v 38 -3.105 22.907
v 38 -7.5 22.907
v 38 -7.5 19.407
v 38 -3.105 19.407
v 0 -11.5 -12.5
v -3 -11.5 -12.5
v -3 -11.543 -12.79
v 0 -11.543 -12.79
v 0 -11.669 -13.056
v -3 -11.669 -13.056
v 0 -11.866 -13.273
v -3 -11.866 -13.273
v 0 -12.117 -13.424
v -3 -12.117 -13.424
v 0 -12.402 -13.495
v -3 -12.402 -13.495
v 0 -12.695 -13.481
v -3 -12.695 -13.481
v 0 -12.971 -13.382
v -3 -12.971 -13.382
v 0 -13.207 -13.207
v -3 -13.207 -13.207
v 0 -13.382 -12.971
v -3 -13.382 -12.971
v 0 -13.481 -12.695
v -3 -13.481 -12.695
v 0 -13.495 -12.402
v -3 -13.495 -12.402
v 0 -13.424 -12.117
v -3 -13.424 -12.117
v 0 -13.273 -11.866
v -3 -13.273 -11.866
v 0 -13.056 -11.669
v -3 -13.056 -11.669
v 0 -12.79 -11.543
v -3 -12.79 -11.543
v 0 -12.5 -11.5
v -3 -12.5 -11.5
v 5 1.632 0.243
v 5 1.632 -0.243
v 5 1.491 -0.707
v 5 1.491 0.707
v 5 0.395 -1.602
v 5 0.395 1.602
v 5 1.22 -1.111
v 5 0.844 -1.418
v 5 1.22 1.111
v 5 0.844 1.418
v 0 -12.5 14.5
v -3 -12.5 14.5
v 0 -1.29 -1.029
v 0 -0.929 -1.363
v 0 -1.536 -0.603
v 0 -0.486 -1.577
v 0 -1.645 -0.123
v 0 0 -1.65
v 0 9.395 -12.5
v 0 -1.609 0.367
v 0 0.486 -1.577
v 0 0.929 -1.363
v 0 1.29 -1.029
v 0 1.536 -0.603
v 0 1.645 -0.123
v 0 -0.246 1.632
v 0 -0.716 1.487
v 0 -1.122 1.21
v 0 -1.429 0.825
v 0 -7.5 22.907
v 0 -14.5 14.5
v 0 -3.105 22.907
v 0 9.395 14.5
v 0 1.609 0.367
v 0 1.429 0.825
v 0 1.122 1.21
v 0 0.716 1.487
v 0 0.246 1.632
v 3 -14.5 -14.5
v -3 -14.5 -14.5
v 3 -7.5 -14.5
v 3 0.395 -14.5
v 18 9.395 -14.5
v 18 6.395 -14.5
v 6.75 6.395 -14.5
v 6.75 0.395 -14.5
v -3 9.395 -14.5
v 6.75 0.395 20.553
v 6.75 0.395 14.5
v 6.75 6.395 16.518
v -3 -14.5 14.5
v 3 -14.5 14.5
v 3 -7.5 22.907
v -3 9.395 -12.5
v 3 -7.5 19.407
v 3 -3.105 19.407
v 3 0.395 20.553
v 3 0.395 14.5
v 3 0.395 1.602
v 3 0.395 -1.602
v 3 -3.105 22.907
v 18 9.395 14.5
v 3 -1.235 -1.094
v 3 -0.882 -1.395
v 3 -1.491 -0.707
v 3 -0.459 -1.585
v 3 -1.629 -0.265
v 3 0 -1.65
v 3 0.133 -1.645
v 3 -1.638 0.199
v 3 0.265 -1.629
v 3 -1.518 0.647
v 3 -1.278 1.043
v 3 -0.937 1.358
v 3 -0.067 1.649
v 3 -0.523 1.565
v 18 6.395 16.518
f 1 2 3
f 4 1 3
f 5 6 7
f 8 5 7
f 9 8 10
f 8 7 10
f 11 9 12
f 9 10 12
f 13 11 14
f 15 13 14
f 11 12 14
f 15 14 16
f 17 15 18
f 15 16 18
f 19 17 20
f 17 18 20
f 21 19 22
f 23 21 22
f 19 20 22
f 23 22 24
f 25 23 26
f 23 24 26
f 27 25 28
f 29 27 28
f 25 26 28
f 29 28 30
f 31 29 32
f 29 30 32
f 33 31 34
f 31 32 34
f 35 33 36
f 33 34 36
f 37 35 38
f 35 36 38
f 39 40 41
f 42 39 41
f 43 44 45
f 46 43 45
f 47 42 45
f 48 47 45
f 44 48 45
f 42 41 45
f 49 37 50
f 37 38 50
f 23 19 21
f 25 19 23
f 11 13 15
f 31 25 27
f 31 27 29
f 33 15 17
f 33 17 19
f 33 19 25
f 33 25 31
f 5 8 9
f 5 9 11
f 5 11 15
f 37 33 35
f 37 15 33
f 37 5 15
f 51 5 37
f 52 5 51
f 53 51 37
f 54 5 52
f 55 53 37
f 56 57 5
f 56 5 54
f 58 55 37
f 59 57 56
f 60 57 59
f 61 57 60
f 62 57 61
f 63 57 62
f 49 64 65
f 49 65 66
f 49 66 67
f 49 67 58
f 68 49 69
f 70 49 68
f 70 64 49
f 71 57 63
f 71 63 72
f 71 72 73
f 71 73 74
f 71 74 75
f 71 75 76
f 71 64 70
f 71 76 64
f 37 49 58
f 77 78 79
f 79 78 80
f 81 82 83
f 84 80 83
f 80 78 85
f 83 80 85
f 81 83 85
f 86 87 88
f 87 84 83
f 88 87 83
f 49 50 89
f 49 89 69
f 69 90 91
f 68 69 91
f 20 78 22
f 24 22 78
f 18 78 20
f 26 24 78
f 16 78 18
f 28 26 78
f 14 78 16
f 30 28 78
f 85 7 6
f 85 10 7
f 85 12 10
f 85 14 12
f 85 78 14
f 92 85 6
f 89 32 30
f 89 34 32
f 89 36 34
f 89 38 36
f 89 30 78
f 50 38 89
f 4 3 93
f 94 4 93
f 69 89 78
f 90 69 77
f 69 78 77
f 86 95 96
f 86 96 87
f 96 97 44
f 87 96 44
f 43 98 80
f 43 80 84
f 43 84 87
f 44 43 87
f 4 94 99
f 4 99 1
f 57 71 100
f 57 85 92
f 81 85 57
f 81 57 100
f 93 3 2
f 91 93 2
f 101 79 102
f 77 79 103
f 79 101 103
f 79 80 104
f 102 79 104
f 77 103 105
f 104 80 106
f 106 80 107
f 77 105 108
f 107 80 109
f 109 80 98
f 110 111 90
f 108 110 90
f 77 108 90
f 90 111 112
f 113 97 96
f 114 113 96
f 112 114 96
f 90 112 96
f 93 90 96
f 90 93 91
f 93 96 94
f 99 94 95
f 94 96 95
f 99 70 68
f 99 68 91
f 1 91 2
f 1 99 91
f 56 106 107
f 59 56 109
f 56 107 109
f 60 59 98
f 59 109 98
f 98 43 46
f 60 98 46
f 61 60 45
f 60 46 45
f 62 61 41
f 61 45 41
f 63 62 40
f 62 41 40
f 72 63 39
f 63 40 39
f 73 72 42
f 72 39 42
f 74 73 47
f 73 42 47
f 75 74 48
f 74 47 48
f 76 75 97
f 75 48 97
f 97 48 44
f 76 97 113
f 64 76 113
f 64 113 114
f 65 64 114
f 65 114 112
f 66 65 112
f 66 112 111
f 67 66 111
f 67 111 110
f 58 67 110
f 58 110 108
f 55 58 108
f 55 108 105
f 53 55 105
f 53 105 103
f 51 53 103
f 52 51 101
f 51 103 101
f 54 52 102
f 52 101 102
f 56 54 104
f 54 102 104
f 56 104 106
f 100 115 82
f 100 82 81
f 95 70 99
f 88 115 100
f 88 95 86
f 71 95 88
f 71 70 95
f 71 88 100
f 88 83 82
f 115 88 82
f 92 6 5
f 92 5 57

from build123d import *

# Parameters (mm, degrees)
EXTRUDE_1_DEPTH        = 5
EXTRUDE_1_DEPTH_BACK   = 3
SKETCH_2_W             = 29
SKETCH_2_H             = 29
SKETCH_3_W             = 25
SKETCH_3_H             = 25
CUT_EXTRUDE_1_DEPTH    = 3
SKETCH_5_R             = 1
CUT_EXTRUDE_3_DEPTH    = 3
CUT_EXTRUDE_4_DEPTH    = 23.011360703
HOLE_WIZARD_M4_1_D     = 3.3
HOLE_WIZARD_M4_1_DEPTH = 10.1
HOLE_WIZARD_M4_1_TIP   = 0.991420021
SKETCH_4_W             = 8
SKETCH_4_H             = 29
EXTRUDE_2_DEPTH        = 13.4052
SKETCH_7_W             = 29
SKETCH_7_H             = 5
EXTRUDE_3_DEPTH        = 5
SKETCH_10_W            = 29
SKETCH_10_H            = 13.4052
CUT_EXTRUDE_5_DEPTH    = 35.028667136
EXTRUDE_4_DEPTH        = 28
SKETCH_13_W            = 22.441758485
SKETCH_13_H            = 29
CUT_EXTRUDE_7_DEPTH    = 20.8948
SKETCH_14_W            = 27
SKETCH_14_H            = 6.1052
CUT_EXTRUDE_8_DEPTH    = 10
EXTRUDE_5_DEPTH        = 10
SKETCH_16_W            = 12.441758485
SKETCH_16_H            = 20.8948
CUT_EXTRUDE_9_DEPTH    = 5
CUT_EXTRUDE_10_DEPTH   = 5
SKETCH_18_W            = 7.441758485
SKETCH_18_H            = 20.8948
CUT_EXTRUDE_11_DEPTH   = 1.9068532
SKETCH_19_W            = 18
SKETCH_19_H            = 8
CUT_EXTRUDE_12_DEPTH   = 7
SKETCH_20_W            = 3.0931468
SKETCH_20_H            = 11
EXTRUDE_6_DEPTH        = 20
SKETCH_21_W            = 3.0931468
SKETCH_21_H            = 2.8948
CUT_EXTRUDE_13_DEPTH   = 7.441758485
SKETCH_22_W            = 29
SKETCH_22_H            = 7
CUT_EXTRUDE_14_DEPTH   = 7.558241515
EXTRUDE_7_DEPTH        = 3
SKETCH_24_W            = 3
SKETCH_24_H            = 11
CUT_EXTRUDE_15_DEPTH   = 50.942466899
CUT_EXTRUDE_16_DEPTH   = 3.8082415
SKETCH_26_W            = 11.249999985
SKETCH_26_H            = 6.1052
CUT_EXTRUDE_17_DEPTH   = 6.0931468
SKETCH_27_W            = 6.0931468
SKETCH_27_H            = 6.1052
CUT_EXTRUDE_18_DEPTH   = 43.86096708
CUT_EXTRUDE_19_DEPTH   = 3.1052
SKETCH_30_W            = 3.750000015
SKETCH_30_H            = 32.721043552
CUT_EXTRUDE_20_DEPTH   = 7.8948
CUT_EXTRUDE_21_DEPTH   = 4.9068532
SKETCH_32_W            = 31.249999985
SKETCH_32_H            = 6.0931468
CUT_EXTRUDE_22_DEPTH   = 3.5
SKETCH_33_W            = 11
SKETCH_33_H            = 13.8948
EXTRUDE_8_DEPTH        = 3
SKETCH_34_W            = 11
SKETCH_34_H            = 6.3948
CUT_EXTRUDE_25_DEPTH   = 49.005208051
EXTRUDE_9_DEPTH        = 0.3948
SKETCH_36_W            = 38
SKETCH_36_H            = 7.8948
CUT_EXTRUDE_26_DEPTH   = 2.5931468
CUT_EXTRUDE_27_DEPTH   = 3.5
SKETCH_38_W            = 1.185809648
SKETCH_38_H            = 4.3948
CUT_EXTRUDE_28_DEPTH   = 3.750000015
EXTRUDE_11_DEPTH       = 3
EXTRUDE_12_REACH       = 51.952


with BuildPart() as part:
    # 草图2 → 凸台-拉伸1 (new, two sides: drawn at the far end of the back side and taken through both)
    with BuildSketch(Plane(origin=(0, 0, 0), x_dir=(0, 0, -1), z_dir=(1, 0, 0)).offset(-EXTRUDE_1_DEPTH_BACK)):
        Rectangle(SKETCH_2_W, SKETCH_2_H)
    extrude(amount=EXTRUDE_1_DEPTH + EXTRUDE_1_DEPTH_BACK)

    # 草图3 → 切除-拉伸1 (cut)
    with BuildSketch(Plane.ZY.offset(3)):
        Rectangle(SKETCH_3_W, SKETCH_3_H)
    extrude(amount=-CUT_EXTRUDE_1_DEPTH, mode=Mode.SUBTRACT)

    # 草图5 → 切除-拉伸3 (cut)
    with BuildSketch(Plane.ZY.offset(3)):
        with Locations((-12.5, -12.5)):
            Circle(SKETCH_5_R)
    extrude(amount=-CUT_EXTRUDE_3_DEPTH, mode=Mode.SUBTRACT)

    # 草图6 → 切除-拉伸4 (cut, through all)
    with BuildSketch(Plane.ZY.offset(3)):
        Polygon((12.5, 12.5), (12.5, -12.5), (14.5, -12.5), (14.5, 14.5), (-12.5, 14.5), (-14.5, 14.5), (-14.5, 12.5), (-12.5, 12.5), align=None)
    extrude(amount=-CUT_EXTRUDE_4_DEPTH, mode=Mode.SUBTRACT)

    # M4 螺纹孔1
    with Locations(Plane.ZY):
        with Locations((0, 0)):
            Hole(HOLE_WIZARD_M4_1_D / 2, depth=HOLE_WIZARD_M4_1_DEPTH)
            with Locations((0, 0, -(HOLE_WIZARD_M4_1_DEPTH + HOLE_WIZARD_M4_1_TIP / 2))):  # 118° drill point
                Cone(0, HOLE_WIZARD_M4_1_D / 2, HOLE_WIZARD_M4_1_TIP, mode=Mode.SUBTRACT)

    # 草图4 → 凸台-拉伸2 (add)
    with BuildSketch(Plane.XZ.offset(14.5)):
        with Locations((1, 0)):
            Rectangle(SKETCH_4_W, SKETCH_4_H)
    extrude(amount=EXTRUDE_2_DEPTH)

    # 草图7 → 凸台-拉伸3 (add)
    with BuildSketch(Plane(origin=(5, 0, 0), x_dir=(0, 0, -1), z_dir=(1, 0, 0))):
        with Locations((0, -25.4052)):
            Rectangle(SKETCH_7_W, SKETCH_7_H)
    extrude(amount=EXTRUDE_3_DEPTH)

    # 草图10 → 切除-拉伸5 (cut, through all)
    with BuildSketch(Plane.ZY.offset(3)):
        with Locations((0, -21.2026)):
            Rectangle(SKETCH_10_W, SKETCH_10_H)
    extrude(amount=-CUT_EXTRUDE_5_DEPTH, mode=Mode.SUBTRACT)

    # 草图12 → 凸台-拉伸4 (add)
    with BuildSketch(Plane(origin=(5, 0, 0), x_dir=(0, 0, -1), z_dir=(1, 0, 0))):
        Polygon((-14.5, -14.5), (14.5, -14.5), (14.5, 12.5), (-12.5, 12.5), (-12.5, -12.5), (-14.5, -12.5), align=None)
    extrude(amount=EXTRUDE_4_DEPTH)

    # 草图13 → 切除-拉伸7 (cut)
    with BuildSketch(Plane.XZ.offset(14.5)):
        with Locations((21.779120757, 0)):
            Rectangle(SKETCH_13_W, SKETCH_13_H)
    extrude(amount=-CUT_EXTRUDE_7_DEPTH, mode=Mode.SUBTRACT)

    # 草图14 → 切除-拉伸8 (cut)
    with BuildSketch(Plane(origin=(33, 0, 0), x_dir=(0, 0, -1), z_dir=(1, 0, 0))):
        with Locations((1, 9.4474)):
            Rectangle(SKETCH_14_W, SKETCH_14_H)
    extrude(amount=-CUT_EXTRUDE_8_DEPTH, mode=Mode.SUBTRACT)

    # 草图15 → 凸台-拉伸5 (add)
    with BuildSketch(Plane.XY.offset(12.5)):
        Polygon((23, 6.3948), (23, 12.5), (0, 12.5), (0, -14.5), (23, -14.5), align=None)
    extrude(amount=EXTRUDE_5_DEPTH)

    # 草图16 → 切除-拉伸9 (cut)
    with BuildSketch(Plane(origin=(0, 0, 12.5), x_dir=(-1, 0, 0), z_dir=(0, 0, -1))):
        with Locations((-16.779120757, -4.0526)):
            Rectangle(SKETCH_16_W, SKETCH_16_H)
    extrude(amount=-CUT_EXTRUDE_9_DEPTH, mode=Mode.SUBTRACT)

    # 草图17 → 切除-拉伸10 (cut)
    with BuildSketch(Plane(origin=(23, 0, 0), x_dir=(0, 0, -1), z_dir=(1, 0, 0))):
        Polygon((-17.5, -14.5), (-17.5, 6.3948), (14.5, 6.3948), (14.5, 12.5), (-22.5, 12.5), (-22.5, -14.5), align=None)
    extrude(amount=-CUT_EXTRUDE_10_DEPTH, mode=Mode.SUBTRACT)

    # 草图18 → 切除-拉伸11 (cut)
    with BuildSketch(Plane(origin=(0, 0, 17.5), x_dir=(-1, 0, 0), z_dir=(0, 0, -1))):
        with Locations((-14.279120757, -4.0526)):
            Rectangle(SKETCH_18_W, SKETCH_18_H)
    extrude(amount=-CUT_EXTRUDE_11_DEPTH, mode=Mode.SUBTRACT)

    # 草图19 → 切除-拉伸12 (cut)
    with BuildSketch(Plane.XZ.offset(14.5)):
        with Locations((9, 18.5)):
            Rectangle(SKETCH_19_W, SKETCH_19_H)
    extrude(amount=-CUT_EXTRUDE_12_DEPTH, mode=Mode.SUBTRACT)

    # 草图20 → 凸台-拉伸6 (add)
    with BuildSketch(Plane(origin=(18, 0, 0), x_dir=(0, 0, -1), z_dir=(1, 0, 0))):
        with Locations((-20.9534266, -2)):
            Rectangle(SKETCH_20_W, SKETCH_20_H)
    extrude(amount=EXTRUDE_6_DEPTH)

    # 草图21 → 切除-拉伸13 (cut)
    with BuildSketch(Plane(origin=(18, 0, 0), x_dir=(0, 0, -1), z_dir=(1, 0, 0))):
        with Locations((-20.9534266, 4.9474)):
            Rectangle(SKETCH_21_W, SKETCH_21_H)
    extrude(amount=-CUT_EXTRUDE_13_DEPTH, mode=Mode.SUBTRACT)

    # 草图22 → 切除-拉伸14 (cut)
    with BuildSketch(Plane(origin=(10.558241515, 0, 0), x_dir=(0, 0, -1), z_dir=(1, 0, 0))):
        with Locations((0, -11)):
            Rectangle(SKETCH_22_W, SKETCH_22_H)
    extrude(amount=-CUT_EXTRUDE_14_DEPTH, mode=Mode.SUBTRACT)

    # 草图23 → 凸台-拉伸7 (add)
    with BuildSketch(Plane.XY.offset(22.5)):
        Polygon((10.558241515, 6.3948), (18, 6.3948), (18, 12.5), (0, 12.5), (0, -7.5), (38, -7.5), (38, 3.5), (10.558241515, 3.5), align=None)
    extrude(amount=EXTRUDE_7_DEPTH)

    # 草图24 → 切除-拉伸15 (cut, through all)
    with BuildSketch(Plane.XZ.offset(7.5)):
        with Locations((1.5, 20)):
            Rectangle(SKETCH_24_W, SKETCH_24_H)
    extrude(amount=-CUT_EXTRUDE_15_DEPTH, mode=Mode.SUBTRACT)

    # 草图25 → 切除-拉伸16 (cut)
    with BuildSketch(Plane(origin=(10.558241515, 0, 0), x_dir=(0, 0, -1), z_dir=(1, 0, 0))):
        Polygon((-19.4068532, -7.5), (14.5, -7.5), (14.5, 6.3948), (-25.5, 6.3948), (-25.5, 3.5), (-19.4068532, 3.5), align=None)
    extrude(amount=-CUT_EXTRUDE_16_DEPTH, mode=Mode.SUBTRACT)

    # 草图26 → 切除-拉伸17 (cut)
    with BuildSketch(Plane.XY.offset(25.5)):
        with Locations((12.375000008, 9.4474)):
            Rectangle(SKETCH_26_W, SKETCH_26_H)
    extrude(amount=-CUT_EXTRUDE_17_DEPTH, mode=Mode.SUBTRACT)

    # 草图27 → 切除-拉伸18 (cut, through all)
    with BuildSketch(Plane(origin=(6.750000015, 0, 0), x_dir=(0, 0, -1), z_dir=(1, 0, 0))):
        with Locations((-22.4534266, 9.4474)):
            Rectangle(SKETCH_27_W, SKETCH_27_H)
    extrude(amount=-CUT_EXTRUDE_18_DEPTH, mode=Mode.SUBTRACT)

    # 草图28 → 切除-拉伸19 (cut)
    with BuildSketch(Plane(origin=(0, 12.5, 0), x_dir=(1, 0, 0), z_dir=(0, 1, 0))):
        Polygon((3, -14.5), (3, -19.4068532), (18, -19.4068532), (18, 14.5), (-3, 14.5), (-3, 12.5), (0, 12.5), (0, -14.5), align=None)
    extrude(amount=-CUT_EXTRUDE_19_DEPTH, mode=Mode.SUBTRACT)

    # 草图30 → 切除-拉伸20 (cut)
    with BuildSketch(Plane.XZ.offset(7.5)):
        with Locations((4.875000008, 1.860521776)):
            Rectangle(SKETCH_30_W, SKETCH_30_H)
    extrude(amount=-CUT_EXTRUDE_20_DEPTH, mode=Mode.SUBTRACT)

    # 草图31 → 切除-拉伸21 (cut)
    with BuildSketch(Plane.XY.offset(19.4068532)):
        Polygon((18, 6.3948), (18, 9.3948), (3, 9.3948), (3, 6.3948), (6.750000015, 6.3948), align=None)
    extrude(amount=-CUT_EXTRUDE_21_DEPTH, mode=Mode.SUBTRACT)

    # 草图32 → 切除-拉伸22 (cut)
    with BuildSketch(Plane(origin=(0, 3.5, 0), x_dir=(1, 0, 0), z_dir=(0, 1, 0))):
        with Locations((22.375000007, -22.4534266)):
            Rectangle(SKETCH_32_W, SKETCH_32_H)
    extrude(amount=-CUT_EXTRUDE_22_DEPTH, mode=Mode.SUBTRACT)

    # 草图33 → 凸台-拉伸8 (add)
    with BuildSketch(Plane.ZY.offset(-3)):
        with Locations((20, -0.5526)):
            Rectangle(SKETCH_33_W, SKETCH_33_H)
    extrude(amount=EXTRUDE_8_DEPTH)

    # 草图34 → 切除-拉伸25 (cut, through all)
    with BuildSketch(Plane(origin=(0, 0, 0), x_dir=(0, 0, -1), z_dir=(1, 0, 0))):
        with Locations((-20, 3.1974)):
            Rectangle(SKETCH_34_W, SKETCH_34_H)
    extrude(amount=CUT_EXTRUDE_25_DEPTH, mode=Mode.SUBTRACT)

    # 草图35 → 凸台-拉伸9 (add)
    with BuildSketch(Plane(origin=(0, 0, 0), x_dir=(1, 0, 0), z_dir=(0, 1, 0))):
        Polygon((38, -25.5), (38, -19.4068532), (6.750000015, -19.4068532), (6.750000015, -18.221043552), (3, -18.221043552), (3, -14.5), (0, -14.5), (0, -25.5), align=None)
    extrude(amount=EXTRUDE_9_DEPTH)

    # 草图36 → 切除-拉伸26 (cut)
    with BuildSketch(Plane.XY.offset(25.5)):
        with Locations((19, -3.5526)):
            Rectangle(SKETCH_36_W, SKETCH_36_H)
    extrude(amount=-CUT_EXTRUDE_26_DEPTH, mode=Mode.SUBTRACT)

    # 草图37 → 切除-拉伸27 (cut)
    with BuildSketch(Plane(origin=(0, 0.3948, 0), x_dir=(1, 0, 0), z_dir=(0, 1, 0))):
        Polygon((3, -14.5), (0, -14.5), (0, -22.9068532), (38, -22.9068532), (38, -19.4068532), (6.750000015, -19.4068532), (6.750000015, -18.221043552), (3, -18.221043552), align=None)
    extrude(amount=-CUT_EXTRUDE_27_DEPTH, mode=Mode.SUBTRACT)

    # 草图38 → 切除-拉伸28 (cut)
    with BuildSketch(Plane(origin=(6.750000015, 0, 0), x_dir=(0, 0, -1), z_dir=(1, 0, 0))):
        with Locations((-18.813948376, -5.3026)):
            Rectangle(SKETCH_38_W, SKETCH_38_H)
    extrude(amount=-CUT_EXTRUDE_28_DEPTH, mode=Mode.SUBTRACT)

    # 草图39 → 凸台-拉伸11 (add)
    with BuildSketch(Plane(origin=(3, 0, 0), x_dir=(0, 0, -1), z_dir=(1, 0, 0))):
        Polygon((-14.5, 9.3948), (-14.5, -14.5), (-22.9068532, -7.5), (-22.9068532, -3.1052), align=None)
    extrude(amount=-EXTRUDE_11_DEPTH)

    # 凸台-拉伸12: up to this face of the body (flat: up to its plane)
    extrude_12_end = Plane(part.part.faces().sort_by_distance((1.5, 3.1448, 18.7034266))[0])
    # 草图40 → 凸台-拉伸12 (add, up to the picked face)
    with BuildSketch(Plane.XY.offset(14.5), mode=Mode.PRIVATE) as extrude_12_sk1:
        Polygon((3, 9.3948), (3, 0.3948), (6.750000015, 0.3948), (6.750000015, 6.3948), (18, 6.3948), (18, 9.3948), align=None)
    extrude_12_tool1 = split(extrude(extrude_12_sk1.sketch, amount=EXTRUDE_12_REACH, mode=Mode.PRIVATE), bisect_by=extrude_12_end, keep=Keep.BOTH, mode=Mode.PRIVATE)
    add(extrude_12_tool1.solids().sort_by(Axis((3.174929, 4.8948, 14.5), (0, 0, 1)))[0])


solid = part.part
